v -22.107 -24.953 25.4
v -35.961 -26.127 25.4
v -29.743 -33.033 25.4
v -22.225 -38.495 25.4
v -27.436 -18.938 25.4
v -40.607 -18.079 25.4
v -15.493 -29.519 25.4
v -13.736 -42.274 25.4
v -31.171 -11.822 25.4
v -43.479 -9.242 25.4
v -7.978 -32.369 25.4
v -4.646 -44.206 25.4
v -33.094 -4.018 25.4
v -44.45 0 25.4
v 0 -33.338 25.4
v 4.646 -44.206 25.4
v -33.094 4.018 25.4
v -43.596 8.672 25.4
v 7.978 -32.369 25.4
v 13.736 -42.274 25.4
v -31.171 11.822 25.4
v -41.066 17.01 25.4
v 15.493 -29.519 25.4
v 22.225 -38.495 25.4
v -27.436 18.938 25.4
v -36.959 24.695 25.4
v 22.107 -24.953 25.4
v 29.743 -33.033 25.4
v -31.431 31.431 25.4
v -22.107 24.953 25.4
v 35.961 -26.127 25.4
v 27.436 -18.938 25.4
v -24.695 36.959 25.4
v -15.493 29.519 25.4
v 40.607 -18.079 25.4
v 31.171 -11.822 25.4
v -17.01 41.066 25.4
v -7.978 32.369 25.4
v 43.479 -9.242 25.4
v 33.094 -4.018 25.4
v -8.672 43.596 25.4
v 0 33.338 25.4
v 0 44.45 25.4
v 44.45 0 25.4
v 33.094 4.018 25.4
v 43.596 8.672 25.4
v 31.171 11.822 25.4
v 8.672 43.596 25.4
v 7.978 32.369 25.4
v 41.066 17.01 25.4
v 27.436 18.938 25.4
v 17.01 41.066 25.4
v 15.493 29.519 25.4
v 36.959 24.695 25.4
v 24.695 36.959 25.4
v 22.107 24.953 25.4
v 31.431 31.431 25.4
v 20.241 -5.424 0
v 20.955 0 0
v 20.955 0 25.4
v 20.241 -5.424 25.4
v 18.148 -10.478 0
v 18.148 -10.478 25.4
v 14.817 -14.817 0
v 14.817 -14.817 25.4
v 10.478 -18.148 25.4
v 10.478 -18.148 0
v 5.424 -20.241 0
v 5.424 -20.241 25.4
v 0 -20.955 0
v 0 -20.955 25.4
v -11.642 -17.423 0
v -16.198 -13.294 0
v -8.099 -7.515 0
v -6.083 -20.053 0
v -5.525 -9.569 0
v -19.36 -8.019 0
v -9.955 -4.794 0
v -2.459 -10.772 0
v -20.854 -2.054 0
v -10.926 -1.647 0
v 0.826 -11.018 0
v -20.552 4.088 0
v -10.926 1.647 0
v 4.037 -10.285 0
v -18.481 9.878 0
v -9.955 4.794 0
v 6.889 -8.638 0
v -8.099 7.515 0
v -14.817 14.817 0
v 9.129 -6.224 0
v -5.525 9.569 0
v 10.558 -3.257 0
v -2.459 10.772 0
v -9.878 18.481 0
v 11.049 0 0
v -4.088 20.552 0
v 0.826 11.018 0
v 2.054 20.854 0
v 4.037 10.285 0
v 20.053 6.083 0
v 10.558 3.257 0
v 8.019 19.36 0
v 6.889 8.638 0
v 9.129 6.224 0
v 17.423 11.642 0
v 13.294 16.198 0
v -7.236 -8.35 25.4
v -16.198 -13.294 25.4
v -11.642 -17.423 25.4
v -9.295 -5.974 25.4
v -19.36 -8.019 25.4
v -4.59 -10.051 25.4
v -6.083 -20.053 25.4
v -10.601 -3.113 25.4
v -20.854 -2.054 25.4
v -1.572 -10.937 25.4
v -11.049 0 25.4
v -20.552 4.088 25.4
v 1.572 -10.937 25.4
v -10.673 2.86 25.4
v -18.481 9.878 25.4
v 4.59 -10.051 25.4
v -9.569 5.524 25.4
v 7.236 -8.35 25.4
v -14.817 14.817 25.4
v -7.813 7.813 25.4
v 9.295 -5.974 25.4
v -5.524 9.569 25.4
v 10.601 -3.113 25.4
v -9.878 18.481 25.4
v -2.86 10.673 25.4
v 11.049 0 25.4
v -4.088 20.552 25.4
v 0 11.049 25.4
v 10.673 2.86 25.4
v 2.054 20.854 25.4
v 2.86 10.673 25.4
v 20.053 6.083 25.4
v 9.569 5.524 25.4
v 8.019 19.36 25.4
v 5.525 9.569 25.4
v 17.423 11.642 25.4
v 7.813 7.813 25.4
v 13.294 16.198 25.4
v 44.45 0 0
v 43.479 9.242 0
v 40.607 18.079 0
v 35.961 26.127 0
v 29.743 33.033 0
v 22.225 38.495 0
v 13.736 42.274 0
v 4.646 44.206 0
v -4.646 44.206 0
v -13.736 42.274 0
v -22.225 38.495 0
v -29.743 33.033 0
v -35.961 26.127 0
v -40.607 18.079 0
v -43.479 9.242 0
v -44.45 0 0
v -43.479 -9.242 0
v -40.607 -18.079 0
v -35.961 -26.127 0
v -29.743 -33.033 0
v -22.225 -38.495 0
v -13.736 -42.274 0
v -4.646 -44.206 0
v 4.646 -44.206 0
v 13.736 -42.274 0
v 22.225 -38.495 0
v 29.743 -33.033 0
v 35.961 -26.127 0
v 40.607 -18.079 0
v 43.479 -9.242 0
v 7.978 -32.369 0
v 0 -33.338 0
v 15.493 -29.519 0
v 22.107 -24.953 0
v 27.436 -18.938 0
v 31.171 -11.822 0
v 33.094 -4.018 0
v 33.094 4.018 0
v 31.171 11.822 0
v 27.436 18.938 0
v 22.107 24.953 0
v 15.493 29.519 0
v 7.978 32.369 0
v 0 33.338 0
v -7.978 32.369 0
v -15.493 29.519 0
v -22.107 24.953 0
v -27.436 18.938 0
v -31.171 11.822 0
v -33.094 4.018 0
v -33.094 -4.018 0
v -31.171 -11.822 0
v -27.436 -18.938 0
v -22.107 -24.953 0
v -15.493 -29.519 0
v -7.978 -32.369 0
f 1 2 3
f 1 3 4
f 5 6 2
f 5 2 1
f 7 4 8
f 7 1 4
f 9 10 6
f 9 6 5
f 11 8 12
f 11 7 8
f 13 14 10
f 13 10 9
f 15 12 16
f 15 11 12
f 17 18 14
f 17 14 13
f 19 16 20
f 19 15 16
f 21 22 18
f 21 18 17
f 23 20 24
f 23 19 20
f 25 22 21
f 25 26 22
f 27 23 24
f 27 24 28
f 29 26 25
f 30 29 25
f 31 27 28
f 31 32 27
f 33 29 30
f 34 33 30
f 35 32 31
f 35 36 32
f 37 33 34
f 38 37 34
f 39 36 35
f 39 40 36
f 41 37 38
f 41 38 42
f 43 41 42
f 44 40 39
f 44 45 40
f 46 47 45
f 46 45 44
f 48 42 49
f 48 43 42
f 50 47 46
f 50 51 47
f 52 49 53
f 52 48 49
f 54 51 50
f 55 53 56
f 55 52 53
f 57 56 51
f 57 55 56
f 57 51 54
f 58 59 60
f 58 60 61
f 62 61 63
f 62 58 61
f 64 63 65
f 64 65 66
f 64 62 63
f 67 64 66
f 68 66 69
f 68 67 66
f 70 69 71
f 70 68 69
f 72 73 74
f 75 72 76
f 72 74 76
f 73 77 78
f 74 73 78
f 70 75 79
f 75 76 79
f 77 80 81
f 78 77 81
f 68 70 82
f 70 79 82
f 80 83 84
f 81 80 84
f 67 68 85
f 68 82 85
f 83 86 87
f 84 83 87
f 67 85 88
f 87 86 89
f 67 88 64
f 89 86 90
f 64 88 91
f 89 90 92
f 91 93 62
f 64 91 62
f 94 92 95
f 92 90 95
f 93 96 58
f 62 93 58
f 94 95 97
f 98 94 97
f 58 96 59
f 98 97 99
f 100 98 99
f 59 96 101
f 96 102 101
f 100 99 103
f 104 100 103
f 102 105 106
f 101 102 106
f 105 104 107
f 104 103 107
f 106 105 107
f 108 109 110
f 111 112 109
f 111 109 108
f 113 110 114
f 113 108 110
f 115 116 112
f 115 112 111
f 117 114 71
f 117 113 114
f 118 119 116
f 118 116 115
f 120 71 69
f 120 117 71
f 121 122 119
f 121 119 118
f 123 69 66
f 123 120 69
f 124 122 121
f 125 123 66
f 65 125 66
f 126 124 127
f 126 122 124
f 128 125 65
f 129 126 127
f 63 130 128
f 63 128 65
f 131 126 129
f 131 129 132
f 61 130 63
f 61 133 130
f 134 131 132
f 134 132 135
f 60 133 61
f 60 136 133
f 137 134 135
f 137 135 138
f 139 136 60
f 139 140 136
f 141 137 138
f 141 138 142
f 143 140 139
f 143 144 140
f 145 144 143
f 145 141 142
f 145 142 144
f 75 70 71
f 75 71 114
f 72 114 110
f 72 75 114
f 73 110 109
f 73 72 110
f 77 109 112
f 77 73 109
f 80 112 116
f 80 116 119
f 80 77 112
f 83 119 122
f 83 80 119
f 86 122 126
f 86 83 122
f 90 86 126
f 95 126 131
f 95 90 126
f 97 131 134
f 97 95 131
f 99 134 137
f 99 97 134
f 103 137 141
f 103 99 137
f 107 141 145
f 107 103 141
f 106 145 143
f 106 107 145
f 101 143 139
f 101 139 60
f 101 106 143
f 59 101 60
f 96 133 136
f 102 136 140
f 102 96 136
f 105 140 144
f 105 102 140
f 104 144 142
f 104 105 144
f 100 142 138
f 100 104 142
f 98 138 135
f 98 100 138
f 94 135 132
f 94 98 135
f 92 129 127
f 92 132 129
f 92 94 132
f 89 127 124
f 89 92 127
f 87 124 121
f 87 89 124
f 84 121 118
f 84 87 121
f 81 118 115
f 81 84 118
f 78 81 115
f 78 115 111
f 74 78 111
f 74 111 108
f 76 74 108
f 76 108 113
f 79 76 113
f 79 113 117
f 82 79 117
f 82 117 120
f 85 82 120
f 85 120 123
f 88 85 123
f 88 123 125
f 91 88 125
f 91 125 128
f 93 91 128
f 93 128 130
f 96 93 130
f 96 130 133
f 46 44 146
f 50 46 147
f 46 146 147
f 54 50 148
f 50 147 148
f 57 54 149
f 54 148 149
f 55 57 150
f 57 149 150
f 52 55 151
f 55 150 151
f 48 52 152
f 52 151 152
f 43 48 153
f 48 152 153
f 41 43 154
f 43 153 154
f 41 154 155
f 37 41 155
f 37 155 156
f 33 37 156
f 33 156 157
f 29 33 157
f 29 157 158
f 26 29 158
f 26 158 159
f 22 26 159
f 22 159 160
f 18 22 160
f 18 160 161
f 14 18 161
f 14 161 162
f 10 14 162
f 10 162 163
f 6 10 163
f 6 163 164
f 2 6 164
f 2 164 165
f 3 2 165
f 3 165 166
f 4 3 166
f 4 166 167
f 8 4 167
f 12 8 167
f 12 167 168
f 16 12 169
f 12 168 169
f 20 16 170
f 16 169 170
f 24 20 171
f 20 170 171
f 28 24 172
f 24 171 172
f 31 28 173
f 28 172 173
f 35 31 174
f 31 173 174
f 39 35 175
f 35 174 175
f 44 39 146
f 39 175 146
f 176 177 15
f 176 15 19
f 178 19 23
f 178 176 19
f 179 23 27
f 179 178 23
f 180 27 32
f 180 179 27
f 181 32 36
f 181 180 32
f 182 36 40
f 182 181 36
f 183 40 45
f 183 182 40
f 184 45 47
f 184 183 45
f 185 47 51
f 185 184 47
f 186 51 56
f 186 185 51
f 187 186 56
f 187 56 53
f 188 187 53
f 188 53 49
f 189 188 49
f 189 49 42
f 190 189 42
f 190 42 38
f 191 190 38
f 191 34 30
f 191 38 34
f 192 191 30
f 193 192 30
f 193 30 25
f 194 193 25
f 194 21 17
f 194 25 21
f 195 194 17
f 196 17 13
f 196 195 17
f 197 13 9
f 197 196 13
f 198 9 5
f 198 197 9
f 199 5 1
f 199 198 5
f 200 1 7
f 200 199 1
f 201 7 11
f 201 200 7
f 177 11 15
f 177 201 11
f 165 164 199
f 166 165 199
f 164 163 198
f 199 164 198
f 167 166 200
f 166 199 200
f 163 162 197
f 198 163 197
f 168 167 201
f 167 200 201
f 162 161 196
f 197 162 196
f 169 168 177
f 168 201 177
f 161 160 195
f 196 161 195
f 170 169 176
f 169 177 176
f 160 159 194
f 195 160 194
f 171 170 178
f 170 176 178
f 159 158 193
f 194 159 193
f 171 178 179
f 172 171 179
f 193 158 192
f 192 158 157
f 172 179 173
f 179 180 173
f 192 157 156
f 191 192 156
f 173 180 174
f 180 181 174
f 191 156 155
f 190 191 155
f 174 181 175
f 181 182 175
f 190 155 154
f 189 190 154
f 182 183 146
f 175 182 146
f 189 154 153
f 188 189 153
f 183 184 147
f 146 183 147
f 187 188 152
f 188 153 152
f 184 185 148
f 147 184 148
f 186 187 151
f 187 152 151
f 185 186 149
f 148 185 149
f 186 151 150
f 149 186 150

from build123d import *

# Parameters (mm, degrees)
F0_R     = 44.45
F0_R_2   = 11.049
F1_DEPTH = 25.4
F4_DEPTH = 25.4


with BuildPart() as f1:
    # F0 (on Top) → F1 (new body)
    with BuildSketch(Plane.XY):
        Circle(F0_R)
        Circle(F0_R_2, mode=Mode.SUBTRACT)
    extrude(amount=F1_DEPTH)

    # F3 (on Top) + F2 (on face) → F4 (cut)
    with BuildSketch(Plane.XY):
        with BuildLine():
            ThreePointArc((33.3375, 0), (-23.5731723178, 23.5731723178), (0, -33.3375))
            ThreePointArc((0, -33.3375), (23.5731723178, -23.5731723178), (33.3375, 0))
        make_face()
        with BuildLine():
            ThreePointArc((20.955, 0), (14.8174225998, -14.8174225998), (0, -20.955))
            ThreePointArc((0, -20.955), (-14.8174225998, 14.8174225998), (20.955, 0))
        make_face(mode=Mode.SUBTRACT)
    with BuildSketch(Plane.XY.offset(25.4)):
        with BuildLine():
            ThreePointArc((-11.049, 0), (-7.8128228253, 7.8128228253), (0, 11.049))
            Line((0, 11.049), (0, 44.45))
            ThreePointArc((0, 44.45), (-31.4308964237, 31.4308964237), (-44.45, 0))
            Line((-44.45, 0), (-11.049, 0))
        make_face()
    extrude(amount=F4_DEPTH, mode=Mode.SUBTRACT)


solid = f1.part
